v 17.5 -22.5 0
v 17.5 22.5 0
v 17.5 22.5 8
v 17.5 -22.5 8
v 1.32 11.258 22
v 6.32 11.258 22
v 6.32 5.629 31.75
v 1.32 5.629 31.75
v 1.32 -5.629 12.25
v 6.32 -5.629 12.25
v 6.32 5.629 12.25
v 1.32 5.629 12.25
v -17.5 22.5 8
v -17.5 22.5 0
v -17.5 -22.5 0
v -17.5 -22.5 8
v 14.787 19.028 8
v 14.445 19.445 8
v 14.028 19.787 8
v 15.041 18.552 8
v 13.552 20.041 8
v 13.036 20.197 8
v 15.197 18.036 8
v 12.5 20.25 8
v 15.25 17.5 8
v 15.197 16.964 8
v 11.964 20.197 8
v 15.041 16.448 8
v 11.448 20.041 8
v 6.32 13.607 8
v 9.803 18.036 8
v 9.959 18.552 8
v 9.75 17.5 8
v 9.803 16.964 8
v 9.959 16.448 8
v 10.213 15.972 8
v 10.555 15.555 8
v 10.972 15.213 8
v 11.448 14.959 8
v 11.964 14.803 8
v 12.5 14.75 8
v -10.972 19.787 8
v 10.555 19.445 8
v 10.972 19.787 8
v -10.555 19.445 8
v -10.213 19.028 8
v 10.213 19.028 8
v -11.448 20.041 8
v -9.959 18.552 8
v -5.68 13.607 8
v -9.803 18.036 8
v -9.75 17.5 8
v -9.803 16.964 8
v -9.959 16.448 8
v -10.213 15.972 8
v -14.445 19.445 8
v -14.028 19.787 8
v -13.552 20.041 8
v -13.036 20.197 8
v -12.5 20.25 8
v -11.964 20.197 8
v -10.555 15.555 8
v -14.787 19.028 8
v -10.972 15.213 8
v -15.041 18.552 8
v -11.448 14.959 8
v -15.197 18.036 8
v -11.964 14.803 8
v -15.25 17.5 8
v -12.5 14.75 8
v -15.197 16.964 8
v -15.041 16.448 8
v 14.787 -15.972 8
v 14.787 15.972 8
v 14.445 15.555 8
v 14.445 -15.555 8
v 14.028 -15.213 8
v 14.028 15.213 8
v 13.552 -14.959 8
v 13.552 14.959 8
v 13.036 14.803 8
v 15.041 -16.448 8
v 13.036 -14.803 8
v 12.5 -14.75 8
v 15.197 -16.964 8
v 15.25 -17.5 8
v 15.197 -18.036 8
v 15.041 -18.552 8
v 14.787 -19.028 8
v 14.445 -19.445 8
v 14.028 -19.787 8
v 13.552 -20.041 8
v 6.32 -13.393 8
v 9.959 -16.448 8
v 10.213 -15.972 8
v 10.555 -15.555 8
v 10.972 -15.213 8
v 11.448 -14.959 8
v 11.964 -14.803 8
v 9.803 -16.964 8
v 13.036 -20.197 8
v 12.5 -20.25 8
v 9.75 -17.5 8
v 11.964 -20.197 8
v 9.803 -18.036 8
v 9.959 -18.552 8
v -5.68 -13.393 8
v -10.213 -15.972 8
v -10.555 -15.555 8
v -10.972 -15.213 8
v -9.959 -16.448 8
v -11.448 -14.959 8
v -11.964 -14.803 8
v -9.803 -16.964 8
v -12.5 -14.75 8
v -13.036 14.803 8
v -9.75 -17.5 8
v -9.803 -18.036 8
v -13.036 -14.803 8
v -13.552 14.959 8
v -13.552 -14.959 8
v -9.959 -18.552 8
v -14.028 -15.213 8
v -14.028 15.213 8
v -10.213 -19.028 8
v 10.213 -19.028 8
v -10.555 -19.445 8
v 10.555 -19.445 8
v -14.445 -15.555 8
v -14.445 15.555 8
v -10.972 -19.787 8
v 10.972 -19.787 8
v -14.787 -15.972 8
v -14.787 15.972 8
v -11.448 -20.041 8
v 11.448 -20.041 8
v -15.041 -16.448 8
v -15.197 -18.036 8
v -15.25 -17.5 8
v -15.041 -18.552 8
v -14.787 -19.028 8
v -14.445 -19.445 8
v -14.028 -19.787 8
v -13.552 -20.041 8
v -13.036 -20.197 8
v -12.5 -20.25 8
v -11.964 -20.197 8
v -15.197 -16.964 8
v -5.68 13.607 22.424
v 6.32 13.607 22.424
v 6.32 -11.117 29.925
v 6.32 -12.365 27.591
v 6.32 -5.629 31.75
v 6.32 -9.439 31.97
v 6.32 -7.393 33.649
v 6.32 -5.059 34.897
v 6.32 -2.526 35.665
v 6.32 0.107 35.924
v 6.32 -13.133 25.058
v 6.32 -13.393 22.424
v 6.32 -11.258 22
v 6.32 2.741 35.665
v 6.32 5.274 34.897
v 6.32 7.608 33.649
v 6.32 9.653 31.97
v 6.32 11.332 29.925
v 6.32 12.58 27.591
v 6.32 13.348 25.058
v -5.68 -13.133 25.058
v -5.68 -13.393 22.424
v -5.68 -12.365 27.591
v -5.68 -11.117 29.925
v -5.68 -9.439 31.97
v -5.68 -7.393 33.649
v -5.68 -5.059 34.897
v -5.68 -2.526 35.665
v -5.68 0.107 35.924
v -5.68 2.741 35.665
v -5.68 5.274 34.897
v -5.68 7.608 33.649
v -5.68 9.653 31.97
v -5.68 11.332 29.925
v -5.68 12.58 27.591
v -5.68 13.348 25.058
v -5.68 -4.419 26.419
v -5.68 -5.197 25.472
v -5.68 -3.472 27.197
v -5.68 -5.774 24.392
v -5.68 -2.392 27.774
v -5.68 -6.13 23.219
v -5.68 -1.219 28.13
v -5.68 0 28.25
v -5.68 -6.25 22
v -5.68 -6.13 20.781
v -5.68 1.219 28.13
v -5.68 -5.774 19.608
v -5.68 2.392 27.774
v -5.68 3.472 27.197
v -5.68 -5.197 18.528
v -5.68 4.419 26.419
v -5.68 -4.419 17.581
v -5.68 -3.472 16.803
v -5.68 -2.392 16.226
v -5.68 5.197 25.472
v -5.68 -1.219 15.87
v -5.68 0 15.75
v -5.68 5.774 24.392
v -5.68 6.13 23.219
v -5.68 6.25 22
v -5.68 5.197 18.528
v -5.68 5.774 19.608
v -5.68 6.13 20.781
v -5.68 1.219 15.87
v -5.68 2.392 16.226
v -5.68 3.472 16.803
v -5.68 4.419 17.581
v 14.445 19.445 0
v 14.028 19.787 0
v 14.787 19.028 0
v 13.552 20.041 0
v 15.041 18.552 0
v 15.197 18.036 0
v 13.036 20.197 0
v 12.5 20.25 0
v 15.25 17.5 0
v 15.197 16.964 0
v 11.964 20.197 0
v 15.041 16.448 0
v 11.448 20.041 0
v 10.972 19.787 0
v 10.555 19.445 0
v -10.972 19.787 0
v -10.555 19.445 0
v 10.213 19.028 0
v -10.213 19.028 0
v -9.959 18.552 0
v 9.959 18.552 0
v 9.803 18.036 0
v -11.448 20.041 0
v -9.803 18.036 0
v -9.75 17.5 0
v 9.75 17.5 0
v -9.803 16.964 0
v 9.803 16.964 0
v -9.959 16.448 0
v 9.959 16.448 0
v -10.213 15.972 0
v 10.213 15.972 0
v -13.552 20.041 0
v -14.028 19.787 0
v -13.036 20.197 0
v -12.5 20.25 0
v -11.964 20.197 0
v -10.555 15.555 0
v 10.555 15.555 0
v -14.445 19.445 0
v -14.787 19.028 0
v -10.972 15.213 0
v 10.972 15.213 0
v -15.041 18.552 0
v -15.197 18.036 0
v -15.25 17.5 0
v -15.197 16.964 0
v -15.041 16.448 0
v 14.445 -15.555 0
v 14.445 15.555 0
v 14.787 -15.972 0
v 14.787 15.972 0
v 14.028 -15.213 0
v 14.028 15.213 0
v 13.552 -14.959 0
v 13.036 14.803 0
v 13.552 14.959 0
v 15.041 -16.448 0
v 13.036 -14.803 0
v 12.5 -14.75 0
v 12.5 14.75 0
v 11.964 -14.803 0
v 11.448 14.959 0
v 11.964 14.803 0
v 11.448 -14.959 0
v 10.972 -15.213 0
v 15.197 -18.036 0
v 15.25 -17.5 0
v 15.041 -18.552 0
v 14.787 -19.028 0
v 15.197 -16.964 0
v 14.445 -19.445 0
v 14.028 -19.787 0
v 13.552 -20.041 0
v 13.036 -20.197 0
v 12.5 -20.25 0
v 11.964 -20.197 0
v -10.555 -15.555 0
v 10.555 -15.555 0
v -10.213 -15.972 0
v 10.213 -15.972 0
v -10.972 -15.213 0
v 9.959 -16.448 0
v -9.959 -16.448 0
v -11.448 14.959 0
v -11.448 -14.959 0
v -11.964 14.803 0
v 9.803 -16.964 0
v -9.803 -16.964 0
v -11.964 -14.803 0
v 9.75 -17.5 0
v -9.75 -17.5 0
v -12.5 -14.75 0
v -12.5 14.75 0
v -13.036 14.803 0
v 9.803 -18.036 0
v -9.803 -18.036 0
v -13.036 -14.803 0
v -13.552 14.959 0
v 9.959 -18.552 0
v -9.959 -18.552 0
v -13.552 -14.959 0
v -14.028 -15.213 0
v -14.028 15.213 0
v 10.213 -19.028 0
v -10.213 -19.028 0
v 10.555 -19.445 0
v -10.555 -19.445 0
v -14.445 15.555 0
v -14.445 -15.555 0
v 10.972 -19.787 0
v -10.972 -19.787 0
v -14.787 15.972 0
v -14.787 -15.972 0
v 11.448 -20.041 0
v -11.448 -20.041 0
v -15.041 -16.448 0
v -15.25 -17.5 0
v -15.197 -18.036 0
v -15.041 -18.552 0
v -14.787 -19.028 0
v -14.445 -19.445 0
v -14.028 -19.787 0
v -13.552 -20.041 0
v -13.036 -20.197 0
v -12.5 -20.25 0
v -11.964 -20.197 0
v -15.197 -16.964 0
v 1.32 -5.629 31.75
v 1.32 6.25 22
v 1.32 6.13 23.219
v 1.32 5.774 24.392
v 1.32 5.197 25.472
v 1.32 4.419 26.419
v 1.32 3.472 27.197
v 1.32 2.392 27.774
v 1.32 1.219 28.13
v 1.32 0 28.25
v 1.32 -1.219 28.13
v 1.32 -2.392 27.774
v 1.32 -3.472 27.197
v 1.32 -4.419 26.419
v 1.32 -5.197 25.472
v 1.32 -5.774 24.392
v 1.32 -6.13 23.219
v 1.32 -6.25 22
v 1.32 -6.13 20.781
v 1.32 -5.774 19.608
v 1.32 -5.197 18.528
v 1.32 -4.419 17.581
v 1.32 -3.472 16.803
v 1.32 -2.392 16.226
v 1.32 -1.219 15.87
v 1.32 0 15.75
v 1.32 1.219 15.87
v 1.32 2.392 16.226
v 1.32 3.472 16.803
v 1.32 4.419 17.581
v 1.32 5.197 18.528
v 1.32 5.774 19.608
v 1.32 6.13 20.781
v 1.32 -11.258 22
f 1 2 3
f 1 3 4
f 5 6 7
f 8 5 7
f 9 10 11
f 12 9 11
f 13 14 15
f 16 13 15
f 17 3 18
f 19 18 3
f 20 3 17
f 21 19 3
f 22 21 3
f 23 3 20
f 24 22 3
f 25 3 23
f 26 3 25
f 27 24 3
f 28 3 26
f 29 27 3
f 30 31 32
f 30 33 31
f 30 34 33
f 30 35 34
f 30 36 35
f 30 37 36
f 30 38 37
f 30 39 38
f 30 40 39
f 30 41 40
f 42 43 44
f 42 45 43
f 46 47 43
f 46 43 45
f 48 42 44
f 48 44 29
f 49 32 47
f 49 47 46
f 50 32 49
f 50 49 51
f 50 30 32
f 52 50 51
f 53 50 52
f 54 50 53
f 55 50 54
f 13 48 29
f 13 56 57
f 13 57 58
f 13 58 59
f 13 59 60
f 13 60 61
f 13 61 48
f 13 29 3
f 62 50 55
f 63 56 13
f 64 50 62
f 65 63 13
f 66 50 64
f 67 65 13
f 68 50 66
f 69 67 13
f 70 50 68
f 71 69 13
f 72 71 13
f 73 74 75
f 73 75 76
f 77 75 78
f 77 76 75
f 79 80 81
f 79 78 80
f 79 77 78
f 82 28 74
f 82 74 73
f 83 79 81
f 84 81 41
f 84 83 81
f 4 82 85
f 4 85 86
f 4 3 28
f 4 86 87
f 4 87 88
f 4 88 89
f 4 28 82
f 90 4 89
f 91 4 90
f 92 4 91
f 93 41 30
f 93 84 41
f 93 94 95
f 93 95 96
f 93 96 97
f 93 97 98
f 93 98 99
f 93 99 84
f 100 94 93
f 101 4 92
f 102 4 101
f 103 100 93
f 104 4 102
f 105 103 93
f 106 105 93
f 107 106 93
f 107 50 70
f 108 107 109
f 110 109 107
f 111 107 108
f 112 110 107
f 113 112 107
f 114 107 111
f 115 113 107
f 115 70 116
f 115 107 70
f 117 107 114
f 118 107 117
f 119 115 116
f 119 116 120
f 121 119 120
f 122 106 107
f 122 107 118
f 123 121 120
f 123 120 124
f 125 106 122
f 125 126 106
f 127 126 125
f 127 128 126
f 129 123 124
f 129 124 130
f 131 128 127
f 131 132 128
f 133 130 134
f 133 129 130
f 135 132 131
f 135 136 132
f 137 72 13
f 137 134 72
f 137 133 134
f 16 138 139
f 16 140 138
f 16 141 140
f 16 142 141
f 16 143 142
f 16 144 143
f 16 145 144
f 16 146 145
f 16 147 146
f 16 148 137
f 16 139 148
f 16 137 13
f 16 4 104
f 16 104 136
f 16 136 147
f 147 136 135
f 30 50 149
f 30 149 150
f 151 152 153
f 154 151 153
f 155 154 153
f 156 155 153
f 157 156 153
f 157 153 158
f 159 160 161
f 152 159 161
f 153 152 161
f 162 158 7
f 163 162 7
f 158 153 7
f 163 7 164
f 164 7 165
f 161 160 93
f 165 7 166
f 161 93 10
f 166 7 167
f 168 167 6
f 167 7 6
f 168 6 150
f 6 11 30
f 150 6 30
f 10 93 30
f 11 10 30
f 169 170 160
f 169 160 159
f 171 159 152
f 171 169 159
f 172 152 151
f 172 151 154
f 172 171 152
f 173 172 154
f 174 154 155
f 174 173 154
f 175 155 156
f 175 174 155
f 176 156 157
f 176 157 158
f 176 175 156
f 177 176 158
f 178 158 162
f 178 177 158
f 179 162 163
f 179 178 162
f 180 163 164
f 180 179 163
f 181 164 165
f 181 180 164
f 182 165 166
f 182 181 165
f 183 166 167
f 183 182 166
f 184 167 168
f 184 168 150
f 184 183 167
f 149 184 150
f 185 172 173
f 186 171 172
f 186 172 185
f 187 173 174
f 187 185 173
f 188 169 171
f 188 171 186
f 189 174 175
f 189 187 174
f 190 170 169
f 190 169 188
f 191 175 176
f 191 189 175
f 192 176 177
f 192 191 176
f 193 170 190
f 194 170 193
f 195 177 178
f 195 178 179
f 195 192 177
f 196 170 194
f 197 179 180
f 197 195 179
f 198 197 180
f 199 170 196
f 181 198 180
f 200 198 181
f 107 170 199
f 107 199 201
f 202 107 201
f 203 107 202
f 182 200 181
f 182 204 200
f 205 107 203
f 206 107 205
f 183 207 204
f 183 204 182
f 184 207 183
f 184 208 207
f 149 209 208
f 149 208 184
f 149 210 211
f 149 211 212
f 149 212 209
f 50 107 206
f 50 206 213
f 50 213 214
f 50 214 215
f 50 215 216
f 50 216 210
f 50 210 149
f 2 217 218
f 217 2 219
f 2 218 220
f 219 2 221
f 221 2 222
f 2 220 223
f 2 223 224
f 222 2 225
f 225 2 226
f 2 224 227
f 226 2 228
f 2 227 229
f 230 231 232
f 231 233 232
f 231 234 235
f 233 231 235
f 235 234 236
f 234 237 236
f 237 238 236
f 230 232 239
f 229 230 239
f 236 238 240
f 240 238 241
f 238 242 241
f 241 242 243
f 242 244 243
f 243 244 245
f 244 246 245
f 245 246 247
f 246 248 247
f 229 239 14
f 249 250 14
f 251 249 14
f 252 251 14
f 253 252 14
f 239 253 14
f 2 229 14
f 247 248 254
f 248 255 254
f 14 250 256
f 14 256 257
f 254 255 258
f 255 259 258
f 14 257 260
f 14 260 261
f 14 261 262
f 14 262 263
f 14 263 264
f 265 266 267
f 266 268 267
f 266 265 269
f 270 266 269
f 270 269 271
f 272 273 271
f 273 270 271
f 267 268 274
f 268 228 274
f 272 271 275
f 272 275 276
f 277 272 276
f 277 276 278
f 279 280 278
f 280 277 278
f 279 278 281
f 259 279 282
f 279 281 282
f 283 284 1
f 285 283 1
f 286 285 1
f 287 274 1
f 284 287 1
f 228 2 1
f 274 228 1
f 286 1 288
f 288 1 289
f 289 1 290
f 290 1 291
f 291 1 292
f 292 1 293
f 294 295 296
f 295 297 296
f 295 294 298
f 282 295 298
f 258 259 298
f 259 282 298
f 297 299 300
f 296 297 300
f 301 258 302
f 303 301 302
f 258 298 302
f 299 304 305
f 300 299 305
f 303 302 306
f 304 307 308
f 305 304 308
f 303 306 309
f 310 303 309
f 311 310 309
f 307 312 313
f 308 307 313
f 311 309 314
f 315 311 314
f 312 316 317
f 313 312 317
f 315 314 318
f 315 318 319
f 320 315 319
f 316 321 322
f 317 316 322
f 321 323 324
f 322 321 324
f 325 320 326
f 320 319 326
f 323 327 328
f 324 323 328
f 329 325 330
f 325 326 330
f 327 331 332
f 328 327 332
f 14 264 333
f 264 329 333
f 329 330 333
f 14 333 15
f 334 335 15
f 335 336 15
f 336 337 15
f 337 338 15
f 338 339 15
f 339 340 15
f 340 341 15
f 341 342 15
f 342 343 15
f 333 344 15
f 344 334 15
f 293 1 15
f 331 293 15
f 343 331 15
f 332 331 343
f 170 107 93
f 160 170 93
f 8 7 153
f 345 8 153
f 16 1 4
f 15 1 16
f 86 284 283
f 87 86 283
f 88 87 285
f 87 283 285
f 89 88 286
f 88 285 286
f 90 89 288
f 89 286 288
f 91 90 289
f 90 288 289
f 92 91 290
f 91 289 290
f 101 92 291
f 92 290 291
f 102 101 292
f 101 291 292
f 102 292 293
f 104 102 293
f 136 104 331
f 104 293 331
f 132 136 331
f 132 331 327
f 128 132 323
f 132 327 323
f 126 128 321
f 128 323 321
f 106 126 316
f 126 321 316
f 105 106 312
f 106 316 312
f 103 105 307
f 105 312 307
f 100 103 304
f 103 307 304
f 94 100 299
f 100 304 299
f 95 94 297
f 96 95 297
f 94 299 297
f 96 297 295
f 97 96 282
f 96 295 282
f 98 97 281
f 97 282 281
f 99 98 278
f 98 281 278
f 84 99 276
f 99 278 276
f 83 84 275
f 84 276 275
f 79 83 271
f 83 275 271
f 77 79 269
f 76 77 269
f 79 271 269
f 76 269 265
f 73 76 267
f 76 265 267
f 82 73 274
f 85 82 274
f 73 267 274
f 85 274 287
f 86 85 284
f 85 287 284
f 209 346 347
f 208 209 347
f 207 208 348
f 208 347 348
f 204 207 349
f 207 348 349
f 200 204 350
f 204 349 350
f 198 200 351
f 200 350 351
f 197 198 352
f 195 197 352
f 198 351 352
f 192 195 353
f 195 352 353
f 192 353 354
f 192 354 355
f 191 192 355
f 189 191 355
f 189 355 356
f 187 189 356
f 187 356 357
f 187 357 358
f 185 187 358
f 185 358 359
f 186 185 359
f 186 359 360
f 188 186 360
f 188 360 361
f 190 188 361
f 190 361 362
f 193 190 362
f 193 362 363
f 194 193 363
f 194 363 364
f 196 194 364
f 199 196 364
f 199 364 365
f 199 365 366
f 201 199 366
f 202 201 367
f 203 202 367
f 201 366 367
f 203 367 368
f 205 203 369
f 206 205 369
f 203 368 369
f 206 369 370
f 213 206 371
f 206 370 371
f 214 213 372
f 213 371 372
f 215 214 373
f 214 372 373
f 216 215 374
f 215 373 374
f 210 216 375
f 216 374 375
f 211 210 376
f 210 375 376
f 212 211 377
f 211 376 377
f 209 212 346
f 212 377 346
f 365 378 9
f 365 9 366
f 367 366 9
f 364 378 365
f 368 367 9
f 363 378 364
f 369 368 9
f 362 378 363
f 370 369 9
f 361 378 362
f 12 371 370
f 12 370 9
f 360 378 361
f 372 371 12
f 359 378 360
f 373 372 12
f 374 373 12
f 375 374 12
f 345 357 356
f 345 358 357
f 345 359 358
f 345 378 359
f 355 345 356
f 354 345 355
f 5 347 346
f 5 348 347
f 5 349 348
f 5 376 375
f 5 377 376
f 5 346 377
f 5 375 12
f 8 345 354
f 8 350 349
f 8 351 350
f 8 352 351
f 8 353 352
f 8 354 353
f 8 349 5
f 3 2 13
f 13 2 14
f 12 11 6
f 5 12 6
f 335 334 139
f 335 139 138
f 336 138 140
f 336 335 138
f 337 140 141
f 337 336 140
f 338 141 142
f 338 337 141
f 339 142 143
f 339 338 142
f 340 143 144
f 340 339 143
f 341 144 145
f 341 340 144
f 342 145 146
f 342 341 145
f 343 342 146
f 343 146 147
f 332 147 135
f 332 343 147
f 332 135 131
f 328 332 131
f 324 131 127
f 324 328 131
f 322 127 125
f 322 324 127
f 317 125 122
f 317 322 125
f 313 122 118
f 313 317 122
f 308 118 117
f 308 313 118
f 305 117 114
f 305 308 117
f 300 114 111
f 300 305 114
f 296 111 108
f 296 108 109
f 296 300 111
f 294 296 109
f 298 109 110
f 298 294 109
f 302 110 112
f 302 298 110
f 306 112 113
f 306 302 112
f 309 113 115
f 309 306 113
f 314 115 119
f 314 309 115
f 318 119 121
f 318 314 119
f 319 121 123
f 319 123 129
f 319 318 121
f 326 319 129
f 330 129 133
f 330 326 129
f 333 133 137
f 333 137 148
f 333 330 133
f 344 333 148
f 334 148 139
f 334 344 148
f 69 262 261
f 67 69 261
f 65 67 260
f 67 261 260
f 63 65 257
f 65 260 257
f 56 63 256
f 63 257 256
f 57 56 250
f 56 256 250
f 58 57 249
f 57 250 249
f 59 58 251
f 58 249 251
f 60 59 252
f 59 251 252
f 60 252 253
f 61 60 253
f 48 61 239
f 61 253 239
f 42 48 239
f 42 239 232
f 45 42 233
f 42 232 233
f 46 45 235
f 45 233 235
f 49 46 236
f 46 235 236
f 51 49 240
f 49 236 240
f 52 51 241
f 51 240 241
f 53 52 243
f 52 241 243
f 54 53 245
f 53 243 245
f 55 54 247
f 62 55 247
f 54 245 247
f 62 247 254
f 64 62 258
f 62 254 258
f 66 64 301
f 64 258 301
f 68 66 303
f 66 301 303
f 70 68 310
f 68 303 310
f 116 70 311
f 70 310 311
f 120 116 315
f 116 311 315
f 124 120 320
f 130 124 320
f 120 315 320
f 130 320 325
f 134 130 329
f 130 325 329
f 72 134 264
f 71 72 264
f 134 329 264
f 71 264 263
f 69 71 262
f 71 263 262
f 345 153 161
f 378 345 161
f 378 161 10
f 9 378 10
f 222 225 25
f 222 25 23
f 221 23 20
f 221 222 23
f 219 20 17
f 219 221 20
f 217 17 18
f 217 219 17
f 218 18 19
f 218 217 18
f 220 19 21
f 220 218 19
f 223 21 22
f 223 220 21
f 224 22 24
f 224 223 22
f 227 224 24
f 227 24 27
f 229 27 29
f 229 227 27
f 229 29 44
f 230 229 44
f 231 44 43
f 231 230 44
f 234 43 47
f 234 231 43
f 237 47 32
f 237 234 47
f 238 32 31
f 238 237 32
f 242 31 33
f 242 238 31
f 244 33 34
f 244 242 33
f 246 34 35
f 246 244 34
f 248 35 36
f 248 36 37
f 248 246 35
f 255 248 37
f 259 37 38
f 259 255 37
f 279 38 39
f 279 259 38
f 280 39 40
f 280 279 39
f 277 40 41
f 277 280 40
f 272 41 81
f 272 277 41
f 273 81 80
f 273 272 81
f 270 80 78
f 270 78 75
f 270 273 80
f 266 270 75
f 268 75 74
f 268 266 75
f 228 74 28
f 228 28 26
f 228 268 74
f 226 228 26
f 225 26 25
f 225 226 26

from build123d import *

# Parameters (mm, degrees)
SKETCH001_W            = 17.5
SKETCH001_H            = 22.5
SKETCH001_R            = 2.75
PAD_DEPTH              = 8
SKETCH001_MIRRORED_2_W = 17.5
SKETCH001_MIRRORED_2_H = 22.5
SKETCH001_MIRRORED_2_R = 2.75
PAD_MIRRORED_2_DEPTH   = 8
SKETCH003_W            = 12
SKETCH003_H            = 27
PAD001_DEPTH           = 28
POCKET_DEPTH           = 56
SKETCH006_R            = 6.25
POCKET001_DEPTH        = 23.820636
POCKET001_DEPTH_BACK   = -11.181364
POCKET002_DEPTH        = 5


with BuildPart() as part:
    # Sketch001 → Pad (new body)
    with BuildSketch(Plane.XY):
        with Locations((8.75, 11.25)):
            Rectangle(SKETCH001_W, SKETCH001_H)
        with Locations((12.5, 17.5)):
            Circle(SKETCH001_R, mode=Mode.SUBTRACT)
    pad = extrude(amount=PAD_DEPTH)

    # Sketch001 Mirrored 2 → Pad Mirrored 2 (add)
    with BuildSketch(Plane(origin=(0, 0, 0), x_dir=(-1, 0, 0), z_dir=(0, 0, -1))):
        with Locations((8.75, 11.25)):
            Rectangle(SKETCH001_MIRRORED_2_W, SKETCH001_MIRRORED_2_H)
        with Locations((12.5, 17.5)):
            Circle(SKETCH001_MIRRORED_2_R, mode=Mode.SUBTRACT)
    pad_mirrored_2 = extrude(amount=-PAD_MIRRORED_2_DEPTH)

    # Mirrored001: Pad, Pad Mirrored 2 across Sketch001 H_Axis
    add(pad.mirror(Plane.ZX))
    add(pad_mirrored_2.mirror(Plane.ZX))

    # Sketch003 (on Face12 of MultiTransform) → Pad001 (join)
    with BuildSketch(Plane.XY.offset(8)):
        with Locations((0.319636, 0.107343)):
            Rectangle(SKETCH003_W, SKETCH003_H)
    extrude(amount=PAD001_DEPTH)

    # Sketch004 (on Face23 of Pad001) → Pocket (cut)
    with BuildSketch(Plane(origin=(-5.680364, 0, 0), x_dir=(0, -1, 0), z_dir=(-1, 0, 0))):
        with BuildLine():
            ThreePointArc((13.392657, 22.424454), (-0.107343, 35.924454), (-13.607343, 22.424454))
            Line((-13.607343, 22.424454), (-13.627651, 49.129635))
            Line((-13.627651, 49.129635), (14.64682, 49.129635))
            Line((14.64682, 49.129635), (13.392657, 22.424454))
        make_face()
    extrude(amount=-POCKET_DEPTH, mode=Mode.SUBTRACT)

    # Sketch006 (on Face12 of Pocket) → Pocket001 (cut, two sides)
    with BuildSketch(Plane.YZ.offset(6.319636)) as pocket001_sk:
        with Locations((0, 22)):
            Circle(SKETCH006_R)
    extrude(amount=-POCKET001_DEPTH, mode=Mode.SUBTRACT)
    extrude(pocket001_sk.sketch, amount=-POCKET001_DEPTH_BACK, mode=Mode.SUBTRACT)

    # Sketch007 (on Face12 of Pocket001) → Pocket002 (cut)
    with BuildSketch(Plane.YZ.offset(6.319636)):
        Polygon((5.629165, 12.25), (11.25833, 22), (5.629165, 31.75), (-5.629165, 31.75), (-11.25833, 22), (-5.629165, 12.25), align=None)
    extrude(amount=-POCKET002_DEPTH, mode=Mode.SUBTRACT)


solid = part.part
